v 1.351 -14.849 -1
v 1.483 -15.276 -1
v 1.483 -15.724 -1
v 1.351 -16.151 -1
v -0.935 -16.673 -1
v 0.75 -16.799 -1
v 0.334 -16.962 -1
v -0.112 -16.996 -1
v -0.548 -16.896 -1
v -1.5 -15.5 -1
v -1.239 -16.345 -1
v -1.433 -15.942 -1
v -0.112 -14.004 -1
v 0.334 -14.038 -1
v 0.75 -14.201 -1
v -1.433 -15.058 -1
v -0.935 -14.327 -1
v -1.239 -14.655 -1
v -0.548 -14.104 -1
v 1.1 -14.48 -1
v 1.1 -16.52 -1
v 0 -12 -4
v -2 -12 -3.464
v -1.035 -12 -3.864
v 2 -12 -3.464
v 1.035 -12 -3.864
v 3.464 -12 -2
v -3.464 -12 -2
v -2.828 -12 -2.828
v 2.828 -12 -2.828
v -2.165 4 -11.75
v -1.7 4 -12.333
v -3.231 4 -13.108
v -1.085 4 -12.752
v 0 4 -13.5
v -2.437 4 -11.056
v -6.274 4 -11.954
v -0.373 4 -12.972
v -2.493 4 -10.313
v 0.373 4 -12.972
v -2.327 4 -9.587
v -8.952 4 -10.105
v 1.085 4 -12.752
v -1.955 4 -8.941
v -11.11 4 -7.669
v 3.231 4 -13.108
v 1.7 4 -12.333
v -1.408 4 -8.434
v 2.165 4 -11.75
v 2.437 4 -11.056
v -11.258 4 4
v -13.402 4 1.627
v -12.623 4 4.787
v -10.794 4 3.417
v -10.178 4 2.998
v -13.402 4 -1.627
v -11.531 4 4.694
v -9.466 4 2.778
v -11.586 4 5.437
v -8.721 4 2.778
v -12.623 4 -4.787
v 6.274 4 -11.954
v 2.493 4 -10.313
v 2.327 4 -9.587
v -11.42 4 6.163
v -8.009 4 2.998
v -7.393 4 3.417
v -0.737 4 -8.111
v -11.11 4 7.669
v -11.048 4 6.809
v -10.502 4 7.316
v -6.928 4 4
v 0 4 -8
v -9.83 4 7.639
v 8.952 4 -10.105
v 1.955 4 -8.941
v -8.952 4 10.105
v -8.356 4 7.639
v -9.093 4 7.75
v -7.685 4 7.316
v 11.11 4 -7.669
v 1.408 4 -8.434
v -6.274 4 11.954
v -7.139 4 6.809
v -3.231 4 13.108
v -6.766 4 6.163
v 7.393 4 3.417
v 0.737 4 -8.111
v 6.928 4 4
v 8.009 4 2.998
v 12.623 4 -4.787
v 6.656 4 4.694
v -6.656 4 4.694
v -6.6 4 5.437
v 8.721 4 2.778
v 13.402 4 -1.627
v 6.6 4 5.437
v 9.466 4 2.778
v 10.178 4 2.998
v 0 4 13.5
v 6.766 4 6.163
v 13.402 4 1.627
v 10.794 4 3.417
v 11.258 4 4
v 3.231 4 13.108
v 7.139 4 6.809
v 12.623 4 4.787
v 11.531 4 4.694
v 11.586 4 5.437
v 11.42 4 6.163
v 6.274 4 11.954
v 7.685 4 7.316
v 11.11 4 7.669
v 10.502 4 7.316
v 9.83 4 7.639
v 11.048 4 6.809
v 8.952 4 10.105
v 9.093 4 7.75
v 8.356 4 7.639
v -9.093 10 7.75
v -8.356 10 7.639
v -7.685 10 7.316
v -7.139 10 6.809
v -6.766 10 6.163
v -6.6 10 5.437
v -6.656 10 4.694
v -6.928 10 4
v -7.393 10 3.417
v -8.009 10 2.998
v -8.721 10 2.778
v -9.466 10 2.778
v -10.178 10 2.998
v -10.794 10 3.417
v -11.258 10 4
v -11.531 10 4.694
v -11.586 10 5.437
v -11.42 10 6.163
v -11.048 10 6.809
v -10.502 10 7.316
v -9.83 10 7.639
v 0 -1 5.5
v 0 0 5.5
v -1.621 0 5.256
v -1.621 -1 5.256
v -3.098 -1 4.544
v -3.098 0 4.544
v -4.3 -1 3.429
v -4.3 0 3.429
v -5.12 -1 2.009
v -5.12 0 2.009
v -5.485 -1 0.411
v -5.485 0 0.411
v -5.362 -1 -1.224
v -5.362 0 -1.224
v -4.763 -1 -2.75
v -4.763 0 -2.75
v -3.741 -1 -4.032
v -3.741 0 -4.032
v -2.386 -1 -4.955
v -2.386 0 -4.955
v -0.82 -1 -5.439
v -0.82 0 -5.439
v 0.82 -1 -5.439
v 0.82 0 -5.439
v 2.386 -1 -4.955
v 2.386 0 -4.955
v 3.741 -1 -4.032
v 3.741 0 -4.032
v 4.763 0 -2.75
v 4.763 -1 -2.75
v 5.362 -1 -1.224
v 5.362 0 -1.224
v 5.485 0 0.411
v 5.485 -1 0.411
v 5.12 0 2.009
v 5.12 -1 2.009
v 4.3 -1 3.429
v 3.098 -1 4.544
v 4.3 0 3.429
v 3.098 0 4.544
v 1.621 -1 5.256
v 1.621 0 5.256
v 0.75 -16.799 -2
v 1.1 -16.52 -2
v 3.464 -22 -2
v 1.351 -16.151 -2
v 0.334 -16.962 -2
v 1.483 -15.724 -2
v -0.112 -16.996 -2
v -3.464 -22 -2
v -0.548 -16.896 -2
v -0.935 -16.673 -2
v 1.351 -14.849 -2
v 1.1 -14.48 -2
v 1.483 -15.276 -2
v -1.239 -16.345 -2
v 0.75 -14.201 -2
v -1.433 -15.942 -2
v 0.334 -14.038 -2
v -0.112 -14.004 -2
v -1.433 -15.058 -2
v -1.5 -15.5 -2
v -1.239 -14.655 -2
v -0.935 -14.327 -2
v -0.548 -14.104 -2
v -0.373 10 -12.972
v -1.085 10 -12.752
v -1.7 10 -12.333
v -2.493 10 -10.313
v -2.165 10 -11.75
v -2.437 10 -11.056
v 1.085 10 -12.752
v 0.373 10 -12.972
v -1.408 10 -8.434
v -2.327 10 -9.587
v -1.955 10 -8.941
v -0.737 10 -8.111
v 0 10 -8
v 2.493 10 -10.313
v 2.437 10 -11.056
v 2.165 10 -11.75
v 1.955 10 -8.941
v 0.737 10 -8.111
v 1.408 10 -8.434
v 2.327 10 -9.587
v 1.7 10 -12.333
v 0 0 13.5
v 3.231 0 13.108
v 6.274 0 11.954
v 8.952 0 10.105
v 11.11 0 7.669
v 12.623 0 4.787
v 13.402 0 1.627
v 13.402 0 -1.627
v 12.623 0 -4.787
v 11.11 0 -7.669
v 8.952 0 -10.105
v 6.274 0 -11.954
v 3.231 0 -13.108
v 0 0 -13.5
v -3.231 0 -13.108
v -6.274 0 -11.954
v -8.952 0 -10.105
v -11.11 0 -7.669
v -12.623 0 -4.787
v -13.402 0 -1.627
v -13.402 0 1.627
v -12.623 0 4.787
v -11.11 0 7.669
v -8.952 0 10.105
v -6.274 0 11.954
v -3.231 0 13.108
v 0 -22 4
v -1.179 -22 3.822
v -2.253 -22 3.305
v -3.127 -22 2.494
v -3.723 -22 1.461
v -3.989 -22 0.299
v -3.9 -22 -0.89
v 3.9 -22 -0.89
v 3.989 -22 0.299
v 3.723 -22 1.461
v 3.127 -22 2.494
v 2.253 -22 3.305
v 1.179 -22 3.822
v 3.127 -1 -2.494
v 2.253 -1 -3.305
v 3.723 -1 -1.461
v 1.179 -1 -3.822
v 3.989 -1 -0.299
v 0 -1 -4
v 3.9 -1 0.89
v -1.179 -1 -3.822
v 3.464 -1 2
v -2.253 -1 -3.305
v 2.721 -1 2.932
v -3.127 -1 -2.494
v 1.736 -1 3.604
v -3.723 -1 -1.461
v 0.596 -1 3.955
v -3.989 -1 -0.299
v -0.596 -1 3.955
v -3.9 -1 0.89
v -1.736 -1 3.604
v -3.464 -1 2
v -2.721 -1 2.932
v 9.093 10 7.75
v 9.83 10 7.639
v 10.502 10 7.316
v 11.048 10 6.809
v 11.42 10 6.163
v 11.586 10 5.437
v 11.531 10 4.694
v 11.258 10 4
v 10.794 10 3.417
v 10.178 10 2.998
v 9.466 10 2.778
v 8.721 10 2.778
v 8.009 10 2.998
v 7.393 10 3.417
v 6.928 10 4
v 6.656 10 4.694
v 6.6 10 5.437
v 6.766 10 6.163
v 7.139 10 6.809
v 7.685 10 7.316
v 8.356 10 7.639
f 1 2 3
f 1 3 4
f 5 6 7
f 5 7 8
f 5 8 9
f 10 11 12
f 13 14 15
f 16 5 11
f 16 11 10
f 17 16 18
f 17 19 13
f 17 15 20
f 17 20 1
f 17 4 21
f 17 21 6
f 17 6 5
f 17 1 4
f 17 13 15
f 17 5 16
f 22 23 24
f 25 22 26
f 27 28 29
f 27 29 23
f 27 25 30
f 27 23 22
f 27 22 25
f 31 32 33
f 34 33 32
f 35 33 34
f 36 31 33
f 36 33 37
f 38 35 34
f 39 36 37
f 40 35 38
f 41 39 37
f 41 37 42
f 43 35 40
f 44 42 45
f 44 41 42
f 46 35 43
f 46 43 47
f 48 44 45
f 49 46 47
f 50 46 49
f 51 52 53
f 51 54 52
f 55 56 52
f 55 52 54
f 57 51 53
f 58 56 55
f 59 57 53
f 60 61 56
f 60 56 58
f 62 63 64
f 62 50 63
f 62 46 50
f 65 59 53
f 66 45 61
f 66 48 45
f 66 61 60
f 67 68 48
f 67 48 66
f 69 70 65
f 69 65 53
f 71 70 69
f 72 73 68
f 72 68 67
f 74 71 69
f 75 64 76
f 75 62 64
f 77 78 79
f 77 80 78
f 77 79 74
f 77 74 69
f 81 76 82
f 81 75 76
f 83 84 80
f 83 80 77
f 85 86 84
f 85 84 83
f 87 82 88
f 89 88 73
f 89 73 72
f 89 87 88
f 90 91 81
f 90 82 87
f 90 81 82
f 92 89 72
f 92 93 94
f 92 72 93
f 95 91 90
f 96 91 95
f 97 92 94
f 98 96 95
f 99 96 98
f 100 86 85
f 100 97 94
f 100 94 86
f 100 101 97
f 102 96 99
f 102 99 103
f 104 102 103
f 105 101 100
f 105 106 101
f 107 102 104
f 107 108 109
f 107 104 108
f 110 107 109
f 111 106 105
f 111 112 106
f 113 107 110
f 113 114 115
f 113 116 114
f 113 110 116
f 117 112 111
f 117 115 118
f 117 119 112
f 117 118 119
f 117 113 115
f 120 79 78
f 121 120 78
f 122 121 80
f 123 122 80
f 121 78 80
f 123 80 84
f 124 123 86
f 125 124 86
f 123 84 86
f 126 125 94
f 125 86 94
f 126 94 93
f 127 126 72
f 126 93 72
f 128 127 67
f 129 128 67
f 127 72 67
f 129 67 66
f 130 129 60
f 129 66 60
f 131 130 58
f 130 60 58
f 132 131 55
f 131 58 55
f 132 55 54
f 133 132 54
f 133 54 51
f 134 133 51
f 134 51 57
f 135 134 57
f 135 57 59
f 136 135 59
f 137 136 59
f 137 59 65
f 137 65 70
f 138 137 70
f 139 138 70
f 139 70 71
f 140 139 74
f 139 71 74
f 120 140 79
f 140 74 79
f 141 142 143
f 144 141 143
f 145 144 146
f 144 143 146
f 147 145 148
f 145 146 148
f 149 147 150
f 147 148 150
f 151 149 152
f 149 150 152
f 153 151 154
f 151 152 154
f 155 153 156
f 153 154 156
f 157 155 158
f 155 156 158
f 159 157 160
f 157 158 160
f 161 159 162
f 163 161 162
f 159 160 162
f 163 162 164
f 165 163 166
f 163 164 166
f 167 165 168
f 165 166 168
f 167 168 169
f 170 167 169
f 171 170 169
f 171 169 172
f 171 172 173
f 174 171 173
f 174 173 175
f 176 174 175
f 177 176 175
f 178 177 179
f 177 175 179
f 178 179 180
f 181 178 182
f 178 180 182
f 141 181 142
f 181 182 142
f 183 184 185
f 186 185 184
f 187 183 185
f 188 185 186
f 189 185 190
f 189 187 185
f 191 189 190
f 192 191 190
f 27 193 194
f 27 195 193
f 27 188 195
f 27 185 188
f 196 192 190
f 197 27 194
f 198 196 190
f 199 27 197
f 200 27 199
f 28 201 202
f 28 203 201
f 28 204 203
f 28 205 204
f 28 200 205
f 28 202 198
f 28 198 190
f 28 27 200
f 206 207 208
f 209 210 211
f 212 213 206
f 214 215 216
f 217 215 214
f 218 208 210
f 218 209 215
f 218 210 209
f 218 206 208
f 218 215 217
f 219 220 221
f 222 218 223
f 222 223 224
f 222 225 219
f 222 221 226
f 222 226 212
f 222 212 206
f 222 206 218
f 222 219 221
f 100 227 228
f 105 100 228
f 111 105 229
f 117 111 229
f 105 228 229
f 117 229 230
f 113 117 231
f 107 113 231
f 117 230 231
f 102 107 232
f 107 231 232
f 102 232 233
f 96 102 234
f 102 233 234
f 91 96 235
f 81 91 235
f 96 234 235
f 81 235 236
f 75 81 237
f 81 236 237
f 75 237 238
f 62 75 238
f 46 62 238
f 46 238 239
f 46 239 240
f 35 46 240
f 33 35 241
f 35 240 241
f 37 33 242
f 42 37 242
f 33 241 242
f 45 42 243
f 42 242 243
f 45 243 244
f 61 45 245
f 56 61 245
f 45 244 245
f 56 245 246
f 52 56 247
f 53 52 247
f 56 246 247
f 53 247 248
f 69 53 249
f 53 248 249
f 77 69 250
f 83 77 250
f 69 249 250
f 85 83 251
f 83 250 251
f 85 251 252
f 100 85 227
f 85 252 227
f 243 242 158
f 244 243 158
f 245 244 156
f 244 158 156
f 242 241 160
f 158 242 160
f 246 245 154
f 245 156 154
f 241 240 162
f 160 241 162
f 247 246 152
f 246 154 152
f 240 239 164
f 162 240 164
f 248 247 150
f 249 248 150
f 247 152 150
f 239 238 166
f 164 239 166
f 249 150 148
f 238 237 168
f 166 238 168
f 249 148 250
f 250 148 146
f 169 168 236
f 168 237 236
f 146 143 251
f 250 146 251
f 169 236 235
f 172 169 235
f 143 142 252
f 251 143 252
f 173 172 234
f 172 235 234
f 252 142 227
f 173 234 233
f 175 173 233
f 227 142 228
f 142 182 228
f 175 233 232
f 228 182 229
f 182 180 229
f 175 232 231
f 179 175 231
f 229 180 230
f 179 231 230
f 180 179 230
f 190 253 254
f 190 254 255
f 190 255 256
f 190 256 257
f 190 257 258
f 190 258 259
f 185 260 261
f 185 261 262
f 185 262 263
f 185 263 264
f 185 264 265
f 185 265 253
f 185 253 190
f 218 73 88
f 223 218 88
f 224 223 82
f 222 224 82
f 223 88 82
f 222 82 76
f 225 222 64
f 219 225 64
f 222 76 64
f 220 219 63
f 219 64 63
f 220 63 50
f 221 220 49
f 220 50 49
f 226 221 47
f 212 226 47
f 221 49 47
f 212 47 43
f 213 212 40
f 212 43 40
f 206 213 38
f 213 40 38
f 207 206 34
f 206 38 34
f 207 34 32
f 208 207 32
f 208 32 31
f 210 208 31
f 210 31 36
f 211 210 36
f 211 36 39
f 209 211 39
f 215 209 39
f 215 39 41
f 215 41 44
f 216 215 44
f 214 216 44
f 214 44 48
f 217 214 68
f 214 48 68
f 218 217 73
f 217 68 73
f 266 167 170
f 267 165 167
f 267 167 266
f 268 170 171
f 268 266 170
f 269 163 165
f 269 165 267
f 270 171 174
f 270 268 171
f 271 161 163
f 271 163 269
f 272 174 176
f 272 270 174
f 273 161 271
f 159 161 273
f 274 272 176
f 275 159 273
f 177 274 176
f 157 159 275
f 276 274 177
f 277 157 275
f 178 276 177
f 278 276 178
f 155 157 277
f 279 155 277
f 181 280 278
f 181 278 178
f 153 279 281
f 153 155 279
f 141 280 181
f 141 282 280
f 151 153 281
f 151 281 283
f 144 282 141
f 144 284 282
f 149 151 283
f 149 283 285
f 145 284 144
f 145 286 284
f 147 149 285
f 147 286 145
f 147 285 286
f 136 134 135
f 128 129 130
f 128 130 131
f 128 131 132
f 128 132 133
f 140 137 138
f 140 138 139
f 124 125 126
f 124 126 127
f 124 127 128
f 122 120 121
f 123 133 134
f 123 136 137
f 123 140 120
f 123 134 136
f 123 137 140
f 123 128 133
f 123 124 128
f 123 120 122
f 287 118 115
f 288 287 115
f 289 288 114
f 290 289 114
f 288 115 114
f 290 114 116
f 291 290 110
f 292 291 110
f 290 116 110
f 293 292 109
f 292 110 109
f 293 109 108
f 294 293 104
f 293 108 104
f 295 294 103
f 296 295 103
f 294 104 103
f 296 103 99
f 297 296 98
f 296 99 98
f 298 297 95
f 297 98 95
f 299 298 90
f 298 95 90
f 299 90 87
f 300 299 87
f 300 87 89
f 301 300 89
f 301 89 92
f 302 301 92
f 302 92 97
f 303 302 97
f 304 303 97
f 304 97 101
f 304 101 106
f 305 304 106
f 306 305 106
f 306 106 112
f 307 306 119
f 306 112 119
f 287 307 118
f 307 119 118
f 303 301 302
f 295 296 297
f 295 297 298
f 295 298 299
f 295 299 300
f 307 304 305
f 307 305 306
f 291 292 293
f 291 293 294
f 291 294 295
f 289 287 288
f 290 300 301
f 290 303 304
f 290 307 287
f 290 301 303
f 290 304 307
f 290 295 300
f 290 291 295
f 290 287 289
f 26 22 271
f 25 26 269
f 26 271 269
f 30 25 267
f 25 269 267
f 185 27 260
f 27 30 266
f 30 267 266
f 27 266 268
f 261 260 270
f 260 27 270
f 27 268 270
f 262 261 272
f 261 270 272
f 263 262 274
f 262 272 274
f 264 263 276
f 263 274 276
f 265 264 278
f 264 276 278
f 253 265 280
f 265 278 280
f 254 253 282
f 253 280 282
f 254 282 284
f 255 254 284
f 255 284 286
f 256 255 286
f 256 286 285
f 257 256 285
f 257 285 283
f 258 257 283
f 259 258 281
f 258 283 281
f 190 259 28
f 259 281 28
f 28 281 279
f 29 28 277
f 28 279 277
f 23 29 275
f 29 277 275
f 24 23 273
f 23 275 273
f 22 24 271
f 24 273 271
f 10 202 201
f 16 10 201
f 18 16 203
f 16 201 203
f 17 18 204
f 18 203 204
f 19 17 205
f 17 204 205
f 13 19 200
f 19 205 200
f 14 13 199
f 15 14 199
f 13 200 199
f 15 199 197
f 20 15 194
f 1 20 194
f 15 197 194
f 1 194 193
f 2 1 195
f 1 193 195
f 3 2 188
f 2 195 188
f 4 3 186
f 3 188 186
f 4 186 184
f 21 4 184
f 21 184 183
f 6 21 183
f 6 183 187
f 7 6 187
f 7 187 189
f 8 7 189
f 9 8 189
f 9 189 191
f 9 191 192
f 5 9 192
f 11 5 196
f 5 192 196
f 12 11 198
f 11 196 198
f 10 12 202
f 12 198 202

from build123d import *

# Parameters (mm, degrees)
SKETCH_1_R          = 13.5
EXTRUDE_1_DEPTH     = 4
SKETCH_2_R          = 2.5
EXTRUDE_2_DEPTH     = 6
SKETCH_3_R          = 4
EXTRUDE_3_DEPTH     = 7
SKETCH_4_R          = 5.5
EXTRUDE_4_DEPTH     = 1
SKETCH_5_R          = 4
EXTRUDE_5_DEPTH     = 15
CUT_EXTRUDE_START   = -10
CUT_EXTRUDE_1_DEPTH = 10
SKETCH_7_R          = 1.5
CUT_EXTRUDE_2_DEPTH = 1


with BuildPart() as part:
    # 草图1 → 凸台-拉伸1 (new body)
    with BuildSketch(Plane(origin=(0, 0, 0), x_dir=(1, 0, 0), z_dir=(0, 1, 0))):
        with Locations(Location((0, 0, 0), (0, 0, 270))):
            Circle(SKETCH_1_R)
    extrude(amount=EXTRUDE_1_DEPTH)

    # 草图2 → 凸台-拉伸2 (add)
    with BuildSketch(Plane(origin=(0, 4, 0), x_dir=(1, 0, 0), z_dir=(0, 1, 0))):
        with Locations(Location((0, 10.5, 0), (0, 0, 270))):
            Circle(SKETCH_2_R)
        with Locations(Location((9.09326674, -5.25, 0), (0, 0, 270))):
            Circle(SKETCH_2_R)
        with Locations(Location((-9.09326674, -5.25, 0), (0, 0, 270))):
            Circle(SKETCH_2_R)
    extrude(amount=EXTRUDE_2_DEPTH)

    # 草图3 → 凸台-拉伸3 (add)
    with BuildSketch(Plane.XZ):
        with Locations(Location((0, 0, 0), (0, 0, 270))):
            Circle(SKETCH_3_R)
    extrude(amount=EXTRUDE_3_DEPTH)

    # 草图4 → 凸台-拉伸4 (add)
    with BuildSketch(Plane.XZ):
        with Locations(Location((0, 0, 0), (0, 0, 90))):
            Circle(SKETCH_4_R)
    extrude(amount=EXTRUDE_4_DEPTH)

    # 草图5 → 凸台-拉伸5 (add)
    with BuildSketch(Plane.XZ.offset(7)):
        with Locations(Location((0, 0, 0), (0, 0, 270))):
            Circle(SKETCH_5_R)
    extrude(amount=EXTRUDE_5_DEPTH)

    # 草图6 → 切除-拉伸1 (cut)
    with BuildSketch(Plane.XZ.offset(22).offset(CUT_EXTRUDE_START)):
        with BuildLine():
            Line((3.464101615, -2), (-3.464101615, -2))
            ThreePointArc((-3.464101615, -2), (0, -4), (3.464101615, -2))
        make_face()
    extrude(amount=CUT_EXTRUDE_1_DEPTH, mode=Mode.SUBTRACT)

    # 草图7 → 切除-拉伸2 (cut)
    with BuildSketch(Plane(origin=(0, 0, -2), x_dir=(-1, 0, 0), z_dir=(0, 0, -1))):
        with Locations((0, -15.5)):
            Circle(SKETCH_7_R)
    extrude(amount=-CUT_EXTRUDE_2_DEPTH, mode=Mode.SUBTRACT)


solid = part.part
